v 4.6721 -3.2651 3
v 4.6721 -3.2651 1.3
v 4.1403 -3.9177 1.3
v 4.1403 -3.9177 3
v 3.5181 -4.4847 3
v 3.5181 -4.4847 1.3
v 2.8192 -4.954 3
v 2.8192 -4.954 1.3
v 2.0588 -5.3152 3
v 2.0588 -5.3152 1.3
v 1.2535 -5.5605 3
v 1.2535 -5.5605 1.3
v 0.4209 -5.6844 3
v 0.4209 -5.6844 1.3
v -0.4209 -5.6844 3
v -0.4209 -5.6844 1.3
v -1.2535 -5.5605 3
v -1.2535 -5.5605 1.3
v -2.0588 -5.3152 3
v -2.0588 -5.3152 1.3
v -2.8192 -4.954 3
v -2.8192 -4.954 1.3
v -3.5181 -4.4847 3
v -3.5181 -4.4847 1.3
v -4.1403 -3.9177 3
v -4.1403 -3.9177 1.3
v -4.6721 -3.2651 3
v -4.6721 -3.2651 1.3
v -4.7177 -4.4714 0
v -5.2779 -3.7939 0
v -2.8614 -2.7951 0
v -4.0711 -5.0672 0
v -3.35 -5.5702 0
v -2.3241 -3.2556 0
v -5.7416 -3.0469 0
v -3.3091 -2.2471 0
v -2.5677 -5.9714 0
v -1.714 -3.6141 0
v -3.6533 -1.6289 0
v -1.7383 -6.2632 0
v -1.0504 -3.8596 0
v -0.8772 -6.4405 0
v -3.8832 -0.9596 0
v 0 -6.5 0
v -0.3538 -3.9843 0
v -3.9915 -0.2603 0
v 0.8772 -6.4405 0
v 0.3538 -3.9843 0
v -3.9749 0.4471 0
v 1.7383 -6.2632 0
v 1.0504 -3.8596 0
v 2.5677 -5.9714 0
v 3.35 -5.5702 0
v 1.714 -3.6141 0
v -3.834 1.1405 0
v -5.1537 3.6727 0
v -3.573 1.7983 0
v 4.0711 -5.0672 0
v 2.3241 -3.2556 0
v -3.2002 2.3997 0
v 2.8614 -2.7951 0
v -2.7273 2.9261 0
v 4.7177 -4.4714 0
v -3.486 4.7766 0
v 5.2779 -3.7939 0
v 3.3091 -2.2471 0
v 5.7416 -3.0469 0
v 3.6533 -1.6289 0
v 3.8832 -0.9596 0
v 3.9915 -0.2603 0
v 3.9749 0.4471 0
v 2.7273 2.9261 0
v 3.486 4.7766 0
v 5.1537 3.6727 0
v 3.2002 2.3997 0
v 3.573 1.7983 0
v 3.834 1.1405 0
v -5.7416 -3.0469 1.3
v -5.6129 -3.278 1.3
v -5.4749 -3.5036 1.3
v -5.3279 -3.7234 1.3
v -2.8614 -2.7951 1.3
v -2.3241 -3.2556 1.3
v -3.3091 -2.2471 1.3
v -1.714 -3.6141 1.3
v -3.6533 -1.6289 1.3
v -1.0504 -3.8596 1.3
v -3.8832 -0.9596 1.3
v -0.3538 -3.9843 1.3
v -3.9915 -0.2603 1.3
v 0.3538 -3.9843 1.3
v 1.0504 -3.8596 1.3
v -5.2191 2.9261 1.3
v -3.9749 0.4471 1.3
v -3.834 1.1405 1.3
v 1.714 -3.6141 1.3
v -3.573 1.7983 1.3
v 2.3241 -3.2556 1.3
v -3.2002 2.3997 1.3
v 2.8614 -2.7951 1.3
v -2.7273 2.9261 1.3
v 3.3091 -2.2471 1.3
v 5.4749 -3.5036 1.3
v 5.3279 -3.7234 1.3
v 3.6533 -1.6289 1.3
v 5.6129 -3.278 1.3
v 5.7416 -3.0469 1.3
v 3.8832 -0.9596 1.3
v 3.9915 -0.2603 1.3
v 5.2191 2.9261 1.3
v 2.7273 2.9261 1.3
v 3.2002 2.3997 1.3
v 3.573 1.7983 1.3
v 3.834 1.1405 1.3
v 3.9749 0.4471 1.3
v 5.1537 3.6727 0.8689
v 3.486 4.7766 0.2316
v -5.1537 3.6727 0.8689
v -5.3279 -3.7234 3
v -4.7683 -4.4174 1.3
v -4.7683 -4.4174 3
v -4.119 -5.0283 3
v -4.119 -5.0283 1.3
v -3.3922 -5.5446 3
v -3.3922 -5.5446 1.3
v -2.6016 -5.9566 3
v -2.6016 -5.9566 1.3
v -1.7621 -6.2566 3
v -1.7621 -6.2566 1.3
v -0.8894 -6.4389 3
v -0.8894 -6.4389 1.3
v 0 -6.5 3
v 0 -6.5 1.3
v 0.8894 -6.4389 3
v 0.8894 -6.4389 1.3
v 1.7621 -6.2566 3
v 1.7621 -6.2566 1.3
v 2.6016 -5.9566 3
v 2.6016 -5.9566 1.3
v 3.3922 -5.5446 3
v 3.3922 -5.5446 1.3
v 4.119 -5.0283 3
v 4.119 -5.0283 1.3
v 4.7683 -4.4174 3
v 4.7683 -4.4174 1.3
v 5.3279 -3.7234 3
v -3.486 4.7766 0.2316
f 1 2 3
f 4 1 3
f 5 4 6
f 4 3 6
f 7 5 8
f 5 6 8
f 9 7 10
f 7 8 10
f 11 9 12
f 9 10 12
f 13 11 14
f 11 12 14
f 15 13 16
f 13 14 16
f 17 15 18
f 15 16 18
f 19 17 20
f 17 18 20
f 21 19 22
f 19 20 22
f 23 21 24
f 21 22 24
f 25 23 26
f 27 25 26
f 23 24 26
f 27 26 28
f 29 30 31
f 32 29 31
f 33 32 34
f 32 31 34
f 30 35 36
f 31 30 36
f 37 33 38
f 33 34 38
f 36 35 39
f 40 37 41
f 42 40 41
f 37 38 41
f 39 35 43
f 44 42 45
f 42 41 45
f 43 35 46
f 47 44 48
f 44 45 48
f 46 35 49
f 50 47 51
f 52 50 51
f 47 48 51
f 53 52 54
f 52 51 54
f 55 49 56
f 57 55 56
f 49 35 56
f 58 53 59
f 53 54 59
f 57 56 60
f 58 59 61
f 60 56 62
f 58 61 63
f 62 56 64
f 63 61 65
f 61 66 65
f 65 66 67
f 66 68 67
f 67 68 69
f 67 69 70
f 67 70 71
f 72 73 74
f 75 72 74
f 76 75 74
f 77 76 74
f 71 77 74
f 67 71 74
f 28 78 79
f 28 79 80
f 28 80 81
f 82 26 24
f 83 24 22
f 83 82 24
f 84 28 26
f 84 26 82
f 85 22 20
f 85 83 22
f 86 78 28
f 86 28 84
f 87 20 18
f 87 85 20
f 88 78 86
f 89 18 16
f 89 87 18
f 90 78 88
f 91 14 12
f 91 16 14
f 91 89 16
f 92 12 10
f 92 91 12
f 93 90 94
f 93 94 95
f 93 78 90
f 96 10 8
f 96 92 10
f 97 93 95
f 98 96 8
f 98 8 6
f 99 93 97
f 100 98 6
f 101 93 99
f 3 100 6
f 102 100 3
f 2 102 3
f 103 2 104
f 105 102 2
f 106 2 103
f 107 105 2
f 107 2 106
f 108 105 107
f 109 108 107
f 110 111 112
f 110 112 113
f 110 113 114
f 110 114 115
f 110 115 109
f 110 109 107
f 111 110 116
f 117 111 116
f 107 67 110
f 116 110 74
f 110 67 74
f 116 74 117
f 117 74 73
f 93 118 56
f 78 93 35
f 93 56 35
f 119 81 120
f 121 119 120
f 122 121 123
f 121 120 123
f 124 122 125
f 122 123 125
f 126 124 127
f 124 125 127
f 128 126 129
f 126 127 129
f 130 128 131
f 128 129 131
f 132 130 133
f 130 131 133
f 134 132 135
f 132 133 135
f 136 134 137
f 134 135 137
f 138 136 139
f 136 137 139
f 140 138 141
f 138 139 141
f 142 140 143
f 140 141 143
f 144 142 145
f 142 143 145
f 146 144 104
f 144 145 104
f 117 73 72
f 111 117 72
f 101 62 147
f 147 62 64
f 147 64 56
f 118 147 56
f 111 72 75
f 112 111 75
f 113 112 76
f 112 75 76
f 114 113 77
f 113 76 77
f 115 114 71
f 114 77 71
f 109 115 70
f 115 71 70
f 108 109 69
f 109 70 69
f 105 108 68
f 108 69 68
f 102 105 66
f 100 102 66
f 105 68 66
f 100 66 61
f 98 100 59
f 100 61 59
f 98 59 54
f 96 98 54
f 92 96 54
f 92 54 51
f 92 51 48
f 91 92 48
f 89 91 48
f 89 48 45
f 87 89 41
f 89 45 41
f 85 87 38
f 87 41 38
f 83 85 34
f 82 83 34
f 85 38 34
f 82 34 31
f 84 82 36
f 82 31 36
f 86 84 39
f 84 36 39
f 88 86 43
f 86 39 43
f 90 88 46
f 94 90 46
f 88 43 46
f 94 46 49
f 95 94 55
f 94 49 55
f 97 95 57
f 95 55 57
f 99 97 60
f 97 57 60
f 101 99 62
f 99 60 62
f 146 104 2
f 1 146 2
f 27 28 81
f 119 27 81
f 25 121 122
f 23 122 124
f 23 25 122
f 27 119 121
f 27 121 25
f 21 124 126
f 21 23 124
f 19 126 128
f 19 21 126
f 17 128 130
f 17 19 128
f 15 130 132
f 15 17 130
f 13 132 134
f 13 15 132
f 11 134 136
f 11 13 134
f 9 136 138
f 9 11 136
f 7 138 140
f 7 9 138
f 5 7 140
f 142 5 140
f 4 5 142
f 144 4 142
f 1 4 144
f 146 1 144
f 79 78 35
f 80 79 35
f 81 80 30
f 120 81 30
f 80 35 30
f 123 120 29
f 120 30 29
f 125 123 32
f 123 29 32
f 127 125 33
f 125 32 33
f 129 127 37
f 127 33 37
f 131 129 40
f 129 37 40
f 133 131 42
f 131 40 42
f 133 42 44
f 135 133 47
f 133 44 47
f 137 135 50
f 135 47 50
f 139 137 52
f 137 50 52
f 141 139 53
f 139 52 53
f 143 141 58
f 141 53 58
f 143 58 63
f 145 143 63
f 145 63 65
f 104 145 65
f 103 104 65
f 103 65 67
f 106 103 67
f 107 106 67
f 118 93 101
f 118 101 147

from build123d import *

# Parameters (mm, degrees)
F2_DEPTH = 1.3
F4_DEPTH = 1.7
F6_DEPTH = 12.5


# Not quite as in the source:
# - a feature of the source that left no trace in its solid (it failed there, or was rolled back) is left out


with BuildPart() as f2:
    # F1 (on Top) → F2 (new body)
    with BuildSketch(Plane.XY):
        with BuildLine():
            Line((-5.1537473182, 3.6727124144), (-5.7416372565, -3.0469003289))
            ThreePointArc((-5.7416372565, -3.0469003289), (0, -6.5), (5.7416372565, -3.0469003289))
            Line((5.7416372565, -3.0469003289), (5.1537473182, 3.6727124144))
            Line((5.1537473182, 3.6727124144), (3.4859795486, 4.7765922388))
            Line((3.4859795486, 4.7765922388), (2.7272692442, 2.9260899627))
            ThreePointArc((2.7272692442, 2.9260899627), (0, -4), (-2.7272692442, 2.9260899627))
            Line((-2.7272692442, 2.9260899627), (-3.4859795486, 4.7765922388))
            Line((-3.4859795486, 4.7765922388), (-5.1537473182, 3.6727124144))
        make_face()
    extrude(amount=F2_DEPTH)

    # F3 (on face) → F4 (join)
    with BuildSketch(Plane.XY.offset(1.3)):
        with BuildLine():
            Line((-4.6721311475, -3.2651478589), (-5.3278688525, -3.723414225))
            ThreePointArc((-5.3278688525, -3.723414225), (0, -6.5), (5.3278688525, -3.723414225))
            Line((5.3278688525, -3.723414225), (4.6721311475, -3.2651478589))
            ThreePointArc((4.6721311475, -3.2651478589), (0, -5.7), (-4.6721311475, -3.2651478589))
        make_face()
    extrude(amount=F4_DEPTH)

    # F5 (on Right) → F6 (cut, symmetric)
    with BuildSketch(Plane.YZ):
        Polygon((6.7765922388, 1.3), (2.9260899627, 1.3), (6.7765922388, -0.9230885256), align=None)
    extrude(amount=F6_DEPTH, both=True, mode=Mode.SUBTRACT)


solid = f2.part
